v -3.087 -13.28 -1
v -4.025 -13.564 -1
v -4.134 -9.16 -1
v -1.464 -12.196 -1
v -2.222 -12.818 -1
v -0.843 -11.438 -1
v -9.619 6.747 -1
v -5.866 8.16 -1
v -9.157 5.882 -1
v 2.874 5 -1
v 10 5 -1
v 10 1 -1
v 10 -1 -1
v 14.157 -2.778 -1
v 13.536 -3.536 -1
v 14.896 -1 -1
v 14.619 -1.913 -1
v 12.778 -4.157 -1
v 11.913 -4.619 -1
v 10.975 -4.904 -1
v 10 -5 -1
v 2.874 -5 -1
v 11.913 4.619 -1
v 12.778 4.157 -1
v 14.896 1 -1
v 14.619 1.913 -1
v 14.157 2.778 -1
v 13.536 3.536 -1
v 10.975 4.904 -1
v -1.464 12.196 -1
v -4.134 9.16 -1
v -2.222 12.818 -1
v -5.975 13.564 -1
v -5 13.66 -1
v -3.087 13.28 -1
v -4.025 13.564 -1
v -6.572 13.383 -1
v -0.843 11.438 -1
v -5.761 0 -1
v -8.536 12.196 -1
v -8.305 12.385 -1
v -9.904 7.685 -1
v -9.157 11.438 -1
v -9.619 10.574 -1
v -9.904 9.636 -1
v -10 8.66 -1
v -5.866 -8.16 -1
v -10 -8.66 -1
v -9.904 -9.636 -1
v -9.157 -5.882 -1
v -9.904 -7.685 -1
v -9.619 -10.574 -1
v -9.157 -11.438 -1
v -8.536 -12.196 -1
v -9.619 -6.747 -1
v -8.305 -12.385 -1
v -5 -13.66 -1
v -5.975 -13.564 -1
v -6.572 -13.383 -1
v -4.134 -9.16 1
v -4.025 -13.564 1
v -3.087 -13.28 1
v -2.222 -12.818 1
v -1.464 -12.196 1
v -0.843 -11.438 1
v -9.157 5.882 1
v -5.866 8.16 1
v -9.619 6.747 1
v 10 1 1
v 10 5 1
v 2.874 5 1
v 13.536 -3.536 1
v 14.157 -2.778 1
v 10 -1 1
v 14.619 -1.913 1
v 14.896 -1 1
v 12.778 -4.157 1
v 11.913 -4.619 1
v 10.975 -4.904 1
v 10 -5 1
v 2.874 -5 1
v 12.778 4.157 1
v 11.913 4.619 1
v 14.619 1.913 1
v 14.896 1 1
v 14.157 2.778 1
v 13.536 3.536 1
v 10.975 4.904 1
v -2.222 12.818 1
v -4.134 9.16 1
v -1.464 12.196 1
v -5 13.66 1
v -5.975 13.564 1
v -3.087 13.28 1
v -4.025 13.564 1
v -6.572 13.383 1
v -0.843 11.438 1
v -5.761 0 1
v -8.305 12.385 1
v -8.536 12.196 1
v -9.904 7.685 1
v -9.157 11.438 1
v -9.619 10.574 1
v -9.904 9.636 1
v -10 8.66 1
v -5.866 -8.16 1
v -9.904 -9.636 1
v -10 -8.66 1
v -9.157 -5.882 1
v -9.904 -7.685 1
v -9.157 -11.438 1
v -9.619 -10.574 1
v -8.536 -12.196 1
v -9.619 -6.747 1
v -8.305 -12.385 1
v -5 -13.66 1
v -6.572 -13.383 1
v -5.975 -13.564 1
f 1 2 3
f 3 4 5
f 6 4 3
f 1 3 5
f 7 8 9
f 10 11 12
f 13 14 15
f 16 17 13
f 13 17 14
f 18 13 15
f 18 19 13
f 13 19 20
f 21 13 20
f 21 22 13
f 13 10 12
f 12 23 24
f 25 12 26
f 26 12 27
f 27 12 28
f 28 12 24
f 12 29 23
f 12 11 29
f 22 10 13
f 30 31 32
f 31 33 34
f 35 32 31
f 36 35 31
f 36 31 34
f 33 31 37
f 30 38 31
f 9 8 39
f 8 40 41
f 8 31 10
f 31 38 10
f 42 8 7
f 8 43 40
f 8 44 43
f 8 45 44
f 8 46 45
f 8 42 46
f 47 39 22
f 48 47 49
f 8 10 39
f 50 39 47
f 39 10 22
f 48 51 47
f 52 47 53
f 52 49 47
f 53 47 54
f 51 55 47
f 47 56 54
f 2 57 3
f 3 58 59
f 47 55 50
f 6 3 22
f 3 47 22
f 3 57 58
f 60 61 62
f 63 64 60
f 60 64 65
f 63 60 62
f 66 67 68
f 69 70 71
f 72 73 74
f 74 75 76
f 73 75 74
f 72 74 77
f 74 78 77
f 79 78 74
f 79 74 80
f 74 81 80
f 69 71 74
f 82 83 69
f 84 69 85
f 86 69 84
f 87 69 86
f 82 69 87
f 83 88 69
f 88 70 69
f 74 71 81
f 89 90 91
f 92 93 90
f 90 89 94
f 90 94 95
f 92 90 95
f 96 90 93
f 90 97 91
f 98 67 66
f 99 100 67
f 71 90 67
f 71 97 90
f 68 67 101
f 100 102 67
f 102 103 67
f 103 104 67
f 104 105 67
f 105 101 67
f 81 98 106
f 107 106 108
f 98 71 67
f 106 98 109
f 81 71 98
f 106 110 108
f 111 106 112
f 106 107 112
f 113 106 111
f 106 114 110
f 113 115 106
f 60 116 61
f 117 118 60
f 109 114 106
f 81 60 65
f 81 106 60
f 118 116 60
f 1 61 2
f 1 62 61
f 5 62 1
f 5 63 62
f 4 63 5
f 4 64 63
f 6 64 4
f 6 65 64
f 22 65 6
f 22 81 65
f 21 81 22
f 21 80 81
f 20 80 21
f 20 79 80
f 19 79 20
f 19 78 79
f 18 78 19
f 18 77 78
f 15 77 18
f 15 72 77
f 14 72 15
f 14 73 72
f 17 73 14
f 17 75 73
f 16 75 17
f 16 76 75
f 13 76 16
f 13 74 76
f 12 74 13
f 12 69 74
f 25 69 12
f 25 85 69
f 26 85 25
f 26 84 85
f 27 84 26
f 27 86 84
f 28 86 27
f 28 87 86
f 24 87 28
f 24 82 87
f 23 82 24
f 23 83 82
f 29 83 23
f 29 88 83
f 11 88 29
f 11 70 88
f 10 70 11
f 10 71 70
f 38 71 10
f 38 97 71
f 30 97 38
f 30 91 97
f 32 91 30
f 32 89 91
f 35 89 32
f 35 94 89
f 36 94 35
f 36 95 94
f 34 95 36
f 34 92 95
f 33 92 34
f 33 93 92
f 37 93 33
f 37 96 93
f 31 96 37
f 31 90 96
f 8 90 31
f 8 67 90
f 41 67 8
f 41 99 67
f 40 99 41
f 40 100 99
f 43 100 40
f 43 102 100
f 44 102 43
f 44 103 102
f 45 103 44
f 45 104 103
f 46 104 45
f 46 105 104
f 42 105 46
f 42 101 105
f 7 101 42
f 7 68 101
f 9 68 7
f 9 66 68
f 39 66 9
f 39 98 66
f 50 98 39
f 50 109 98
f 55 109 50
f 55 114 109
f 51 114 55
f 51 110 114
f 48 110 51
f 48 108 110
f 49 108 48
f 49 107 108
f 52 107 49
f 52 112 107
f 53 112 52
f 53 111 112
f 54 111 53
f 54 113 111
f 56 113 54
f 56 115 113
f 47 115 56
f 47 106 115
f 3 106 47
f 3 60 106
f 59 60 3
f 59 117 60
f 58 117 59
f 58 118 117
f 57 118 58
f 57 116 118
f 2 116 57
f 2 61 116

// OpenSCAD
// --- BUILD TYPE ---

// 1: Face
// 2: Edge
PART = 1;

// 0: Tetrahedron
// 1: Hexahedron
// 2: Octahedron
// 3: Dodecahedron
// 4: Icosahedron
// 5: Truncated octahedron hexes and edges (bonus shape!)
SHAPE = 0;

// --- CONFIG ---

HEIGHT = 2;
WIDTH = 10;
LEG_LENGTH = 15;
FACE_RADIUS = 10;

// Set $fs to change arc precision
// (To use $fa instead, set $fs arbitrarily small and make $fa larger)
$fa = 0.01;
$fs = 1;

// --- CONSTANTS AND DERIVED VALUES ---

ANGLES = [
  acos(1 / 3),
  90,
  180 - acos(1 / 3),
  180 - atan(2),
  180 - acos(sqrt(5) / 3),
  2 * acos(1 / sqrt(3))
];

CORNERS = [
  3,
  4,
  3,
  5,
  3,
  6
];

ANGLE = ANGLES[SHAPE];
CORNER = CORNERS[SHAPE];

FACE = PART == 1;
EDGE = PART == 2;

// --- BUILD ---

if (FACE || !1) face();
if (EDGE || !1) edge();
  
// ------

module hole() {
  square([WIDTH, HEIGHT], center=true);
}
module circ(w=WIDTH) {
  circle(w / 2);
}
module leg() {
  linear_extrude(height=HEIGHT, center=true)
  difference() {
    hull() {
      circ();
      translate([LEG_LENGTH, 0])
      circ();
    }
  translate([LEG_LENGTH + WIDTH / 2, 0])
  hole();
  }
}

module edge() {
  leg();
  rotate([0, 0, ANGLE])
  leg();
//  hull() intersection() {
//    union() {
//    leg();
//    rotate([0, 0, ANGLE])
//      leg();
//    }
//    cube([WIDTH, WIDTH, HEIGHT * 2], center=true);
//  }
}

module face() {
  corner_angle = 360 / CORNER;
  linear_extrude(height=HEIGHT, center=true)
  for (i = [0:CORNER - 1])
  difference() {
    hull() {
      circ();
      translate([
        cos(corner_angle * i),
        sin(corner_angle * i)
      ] * FACE_RADIUS)
      circ();
    }
    rotate(corner_angle * i)
    translate([FACE_RADIUS + WIDTH / 2, 0])
    hole();
  }

}
